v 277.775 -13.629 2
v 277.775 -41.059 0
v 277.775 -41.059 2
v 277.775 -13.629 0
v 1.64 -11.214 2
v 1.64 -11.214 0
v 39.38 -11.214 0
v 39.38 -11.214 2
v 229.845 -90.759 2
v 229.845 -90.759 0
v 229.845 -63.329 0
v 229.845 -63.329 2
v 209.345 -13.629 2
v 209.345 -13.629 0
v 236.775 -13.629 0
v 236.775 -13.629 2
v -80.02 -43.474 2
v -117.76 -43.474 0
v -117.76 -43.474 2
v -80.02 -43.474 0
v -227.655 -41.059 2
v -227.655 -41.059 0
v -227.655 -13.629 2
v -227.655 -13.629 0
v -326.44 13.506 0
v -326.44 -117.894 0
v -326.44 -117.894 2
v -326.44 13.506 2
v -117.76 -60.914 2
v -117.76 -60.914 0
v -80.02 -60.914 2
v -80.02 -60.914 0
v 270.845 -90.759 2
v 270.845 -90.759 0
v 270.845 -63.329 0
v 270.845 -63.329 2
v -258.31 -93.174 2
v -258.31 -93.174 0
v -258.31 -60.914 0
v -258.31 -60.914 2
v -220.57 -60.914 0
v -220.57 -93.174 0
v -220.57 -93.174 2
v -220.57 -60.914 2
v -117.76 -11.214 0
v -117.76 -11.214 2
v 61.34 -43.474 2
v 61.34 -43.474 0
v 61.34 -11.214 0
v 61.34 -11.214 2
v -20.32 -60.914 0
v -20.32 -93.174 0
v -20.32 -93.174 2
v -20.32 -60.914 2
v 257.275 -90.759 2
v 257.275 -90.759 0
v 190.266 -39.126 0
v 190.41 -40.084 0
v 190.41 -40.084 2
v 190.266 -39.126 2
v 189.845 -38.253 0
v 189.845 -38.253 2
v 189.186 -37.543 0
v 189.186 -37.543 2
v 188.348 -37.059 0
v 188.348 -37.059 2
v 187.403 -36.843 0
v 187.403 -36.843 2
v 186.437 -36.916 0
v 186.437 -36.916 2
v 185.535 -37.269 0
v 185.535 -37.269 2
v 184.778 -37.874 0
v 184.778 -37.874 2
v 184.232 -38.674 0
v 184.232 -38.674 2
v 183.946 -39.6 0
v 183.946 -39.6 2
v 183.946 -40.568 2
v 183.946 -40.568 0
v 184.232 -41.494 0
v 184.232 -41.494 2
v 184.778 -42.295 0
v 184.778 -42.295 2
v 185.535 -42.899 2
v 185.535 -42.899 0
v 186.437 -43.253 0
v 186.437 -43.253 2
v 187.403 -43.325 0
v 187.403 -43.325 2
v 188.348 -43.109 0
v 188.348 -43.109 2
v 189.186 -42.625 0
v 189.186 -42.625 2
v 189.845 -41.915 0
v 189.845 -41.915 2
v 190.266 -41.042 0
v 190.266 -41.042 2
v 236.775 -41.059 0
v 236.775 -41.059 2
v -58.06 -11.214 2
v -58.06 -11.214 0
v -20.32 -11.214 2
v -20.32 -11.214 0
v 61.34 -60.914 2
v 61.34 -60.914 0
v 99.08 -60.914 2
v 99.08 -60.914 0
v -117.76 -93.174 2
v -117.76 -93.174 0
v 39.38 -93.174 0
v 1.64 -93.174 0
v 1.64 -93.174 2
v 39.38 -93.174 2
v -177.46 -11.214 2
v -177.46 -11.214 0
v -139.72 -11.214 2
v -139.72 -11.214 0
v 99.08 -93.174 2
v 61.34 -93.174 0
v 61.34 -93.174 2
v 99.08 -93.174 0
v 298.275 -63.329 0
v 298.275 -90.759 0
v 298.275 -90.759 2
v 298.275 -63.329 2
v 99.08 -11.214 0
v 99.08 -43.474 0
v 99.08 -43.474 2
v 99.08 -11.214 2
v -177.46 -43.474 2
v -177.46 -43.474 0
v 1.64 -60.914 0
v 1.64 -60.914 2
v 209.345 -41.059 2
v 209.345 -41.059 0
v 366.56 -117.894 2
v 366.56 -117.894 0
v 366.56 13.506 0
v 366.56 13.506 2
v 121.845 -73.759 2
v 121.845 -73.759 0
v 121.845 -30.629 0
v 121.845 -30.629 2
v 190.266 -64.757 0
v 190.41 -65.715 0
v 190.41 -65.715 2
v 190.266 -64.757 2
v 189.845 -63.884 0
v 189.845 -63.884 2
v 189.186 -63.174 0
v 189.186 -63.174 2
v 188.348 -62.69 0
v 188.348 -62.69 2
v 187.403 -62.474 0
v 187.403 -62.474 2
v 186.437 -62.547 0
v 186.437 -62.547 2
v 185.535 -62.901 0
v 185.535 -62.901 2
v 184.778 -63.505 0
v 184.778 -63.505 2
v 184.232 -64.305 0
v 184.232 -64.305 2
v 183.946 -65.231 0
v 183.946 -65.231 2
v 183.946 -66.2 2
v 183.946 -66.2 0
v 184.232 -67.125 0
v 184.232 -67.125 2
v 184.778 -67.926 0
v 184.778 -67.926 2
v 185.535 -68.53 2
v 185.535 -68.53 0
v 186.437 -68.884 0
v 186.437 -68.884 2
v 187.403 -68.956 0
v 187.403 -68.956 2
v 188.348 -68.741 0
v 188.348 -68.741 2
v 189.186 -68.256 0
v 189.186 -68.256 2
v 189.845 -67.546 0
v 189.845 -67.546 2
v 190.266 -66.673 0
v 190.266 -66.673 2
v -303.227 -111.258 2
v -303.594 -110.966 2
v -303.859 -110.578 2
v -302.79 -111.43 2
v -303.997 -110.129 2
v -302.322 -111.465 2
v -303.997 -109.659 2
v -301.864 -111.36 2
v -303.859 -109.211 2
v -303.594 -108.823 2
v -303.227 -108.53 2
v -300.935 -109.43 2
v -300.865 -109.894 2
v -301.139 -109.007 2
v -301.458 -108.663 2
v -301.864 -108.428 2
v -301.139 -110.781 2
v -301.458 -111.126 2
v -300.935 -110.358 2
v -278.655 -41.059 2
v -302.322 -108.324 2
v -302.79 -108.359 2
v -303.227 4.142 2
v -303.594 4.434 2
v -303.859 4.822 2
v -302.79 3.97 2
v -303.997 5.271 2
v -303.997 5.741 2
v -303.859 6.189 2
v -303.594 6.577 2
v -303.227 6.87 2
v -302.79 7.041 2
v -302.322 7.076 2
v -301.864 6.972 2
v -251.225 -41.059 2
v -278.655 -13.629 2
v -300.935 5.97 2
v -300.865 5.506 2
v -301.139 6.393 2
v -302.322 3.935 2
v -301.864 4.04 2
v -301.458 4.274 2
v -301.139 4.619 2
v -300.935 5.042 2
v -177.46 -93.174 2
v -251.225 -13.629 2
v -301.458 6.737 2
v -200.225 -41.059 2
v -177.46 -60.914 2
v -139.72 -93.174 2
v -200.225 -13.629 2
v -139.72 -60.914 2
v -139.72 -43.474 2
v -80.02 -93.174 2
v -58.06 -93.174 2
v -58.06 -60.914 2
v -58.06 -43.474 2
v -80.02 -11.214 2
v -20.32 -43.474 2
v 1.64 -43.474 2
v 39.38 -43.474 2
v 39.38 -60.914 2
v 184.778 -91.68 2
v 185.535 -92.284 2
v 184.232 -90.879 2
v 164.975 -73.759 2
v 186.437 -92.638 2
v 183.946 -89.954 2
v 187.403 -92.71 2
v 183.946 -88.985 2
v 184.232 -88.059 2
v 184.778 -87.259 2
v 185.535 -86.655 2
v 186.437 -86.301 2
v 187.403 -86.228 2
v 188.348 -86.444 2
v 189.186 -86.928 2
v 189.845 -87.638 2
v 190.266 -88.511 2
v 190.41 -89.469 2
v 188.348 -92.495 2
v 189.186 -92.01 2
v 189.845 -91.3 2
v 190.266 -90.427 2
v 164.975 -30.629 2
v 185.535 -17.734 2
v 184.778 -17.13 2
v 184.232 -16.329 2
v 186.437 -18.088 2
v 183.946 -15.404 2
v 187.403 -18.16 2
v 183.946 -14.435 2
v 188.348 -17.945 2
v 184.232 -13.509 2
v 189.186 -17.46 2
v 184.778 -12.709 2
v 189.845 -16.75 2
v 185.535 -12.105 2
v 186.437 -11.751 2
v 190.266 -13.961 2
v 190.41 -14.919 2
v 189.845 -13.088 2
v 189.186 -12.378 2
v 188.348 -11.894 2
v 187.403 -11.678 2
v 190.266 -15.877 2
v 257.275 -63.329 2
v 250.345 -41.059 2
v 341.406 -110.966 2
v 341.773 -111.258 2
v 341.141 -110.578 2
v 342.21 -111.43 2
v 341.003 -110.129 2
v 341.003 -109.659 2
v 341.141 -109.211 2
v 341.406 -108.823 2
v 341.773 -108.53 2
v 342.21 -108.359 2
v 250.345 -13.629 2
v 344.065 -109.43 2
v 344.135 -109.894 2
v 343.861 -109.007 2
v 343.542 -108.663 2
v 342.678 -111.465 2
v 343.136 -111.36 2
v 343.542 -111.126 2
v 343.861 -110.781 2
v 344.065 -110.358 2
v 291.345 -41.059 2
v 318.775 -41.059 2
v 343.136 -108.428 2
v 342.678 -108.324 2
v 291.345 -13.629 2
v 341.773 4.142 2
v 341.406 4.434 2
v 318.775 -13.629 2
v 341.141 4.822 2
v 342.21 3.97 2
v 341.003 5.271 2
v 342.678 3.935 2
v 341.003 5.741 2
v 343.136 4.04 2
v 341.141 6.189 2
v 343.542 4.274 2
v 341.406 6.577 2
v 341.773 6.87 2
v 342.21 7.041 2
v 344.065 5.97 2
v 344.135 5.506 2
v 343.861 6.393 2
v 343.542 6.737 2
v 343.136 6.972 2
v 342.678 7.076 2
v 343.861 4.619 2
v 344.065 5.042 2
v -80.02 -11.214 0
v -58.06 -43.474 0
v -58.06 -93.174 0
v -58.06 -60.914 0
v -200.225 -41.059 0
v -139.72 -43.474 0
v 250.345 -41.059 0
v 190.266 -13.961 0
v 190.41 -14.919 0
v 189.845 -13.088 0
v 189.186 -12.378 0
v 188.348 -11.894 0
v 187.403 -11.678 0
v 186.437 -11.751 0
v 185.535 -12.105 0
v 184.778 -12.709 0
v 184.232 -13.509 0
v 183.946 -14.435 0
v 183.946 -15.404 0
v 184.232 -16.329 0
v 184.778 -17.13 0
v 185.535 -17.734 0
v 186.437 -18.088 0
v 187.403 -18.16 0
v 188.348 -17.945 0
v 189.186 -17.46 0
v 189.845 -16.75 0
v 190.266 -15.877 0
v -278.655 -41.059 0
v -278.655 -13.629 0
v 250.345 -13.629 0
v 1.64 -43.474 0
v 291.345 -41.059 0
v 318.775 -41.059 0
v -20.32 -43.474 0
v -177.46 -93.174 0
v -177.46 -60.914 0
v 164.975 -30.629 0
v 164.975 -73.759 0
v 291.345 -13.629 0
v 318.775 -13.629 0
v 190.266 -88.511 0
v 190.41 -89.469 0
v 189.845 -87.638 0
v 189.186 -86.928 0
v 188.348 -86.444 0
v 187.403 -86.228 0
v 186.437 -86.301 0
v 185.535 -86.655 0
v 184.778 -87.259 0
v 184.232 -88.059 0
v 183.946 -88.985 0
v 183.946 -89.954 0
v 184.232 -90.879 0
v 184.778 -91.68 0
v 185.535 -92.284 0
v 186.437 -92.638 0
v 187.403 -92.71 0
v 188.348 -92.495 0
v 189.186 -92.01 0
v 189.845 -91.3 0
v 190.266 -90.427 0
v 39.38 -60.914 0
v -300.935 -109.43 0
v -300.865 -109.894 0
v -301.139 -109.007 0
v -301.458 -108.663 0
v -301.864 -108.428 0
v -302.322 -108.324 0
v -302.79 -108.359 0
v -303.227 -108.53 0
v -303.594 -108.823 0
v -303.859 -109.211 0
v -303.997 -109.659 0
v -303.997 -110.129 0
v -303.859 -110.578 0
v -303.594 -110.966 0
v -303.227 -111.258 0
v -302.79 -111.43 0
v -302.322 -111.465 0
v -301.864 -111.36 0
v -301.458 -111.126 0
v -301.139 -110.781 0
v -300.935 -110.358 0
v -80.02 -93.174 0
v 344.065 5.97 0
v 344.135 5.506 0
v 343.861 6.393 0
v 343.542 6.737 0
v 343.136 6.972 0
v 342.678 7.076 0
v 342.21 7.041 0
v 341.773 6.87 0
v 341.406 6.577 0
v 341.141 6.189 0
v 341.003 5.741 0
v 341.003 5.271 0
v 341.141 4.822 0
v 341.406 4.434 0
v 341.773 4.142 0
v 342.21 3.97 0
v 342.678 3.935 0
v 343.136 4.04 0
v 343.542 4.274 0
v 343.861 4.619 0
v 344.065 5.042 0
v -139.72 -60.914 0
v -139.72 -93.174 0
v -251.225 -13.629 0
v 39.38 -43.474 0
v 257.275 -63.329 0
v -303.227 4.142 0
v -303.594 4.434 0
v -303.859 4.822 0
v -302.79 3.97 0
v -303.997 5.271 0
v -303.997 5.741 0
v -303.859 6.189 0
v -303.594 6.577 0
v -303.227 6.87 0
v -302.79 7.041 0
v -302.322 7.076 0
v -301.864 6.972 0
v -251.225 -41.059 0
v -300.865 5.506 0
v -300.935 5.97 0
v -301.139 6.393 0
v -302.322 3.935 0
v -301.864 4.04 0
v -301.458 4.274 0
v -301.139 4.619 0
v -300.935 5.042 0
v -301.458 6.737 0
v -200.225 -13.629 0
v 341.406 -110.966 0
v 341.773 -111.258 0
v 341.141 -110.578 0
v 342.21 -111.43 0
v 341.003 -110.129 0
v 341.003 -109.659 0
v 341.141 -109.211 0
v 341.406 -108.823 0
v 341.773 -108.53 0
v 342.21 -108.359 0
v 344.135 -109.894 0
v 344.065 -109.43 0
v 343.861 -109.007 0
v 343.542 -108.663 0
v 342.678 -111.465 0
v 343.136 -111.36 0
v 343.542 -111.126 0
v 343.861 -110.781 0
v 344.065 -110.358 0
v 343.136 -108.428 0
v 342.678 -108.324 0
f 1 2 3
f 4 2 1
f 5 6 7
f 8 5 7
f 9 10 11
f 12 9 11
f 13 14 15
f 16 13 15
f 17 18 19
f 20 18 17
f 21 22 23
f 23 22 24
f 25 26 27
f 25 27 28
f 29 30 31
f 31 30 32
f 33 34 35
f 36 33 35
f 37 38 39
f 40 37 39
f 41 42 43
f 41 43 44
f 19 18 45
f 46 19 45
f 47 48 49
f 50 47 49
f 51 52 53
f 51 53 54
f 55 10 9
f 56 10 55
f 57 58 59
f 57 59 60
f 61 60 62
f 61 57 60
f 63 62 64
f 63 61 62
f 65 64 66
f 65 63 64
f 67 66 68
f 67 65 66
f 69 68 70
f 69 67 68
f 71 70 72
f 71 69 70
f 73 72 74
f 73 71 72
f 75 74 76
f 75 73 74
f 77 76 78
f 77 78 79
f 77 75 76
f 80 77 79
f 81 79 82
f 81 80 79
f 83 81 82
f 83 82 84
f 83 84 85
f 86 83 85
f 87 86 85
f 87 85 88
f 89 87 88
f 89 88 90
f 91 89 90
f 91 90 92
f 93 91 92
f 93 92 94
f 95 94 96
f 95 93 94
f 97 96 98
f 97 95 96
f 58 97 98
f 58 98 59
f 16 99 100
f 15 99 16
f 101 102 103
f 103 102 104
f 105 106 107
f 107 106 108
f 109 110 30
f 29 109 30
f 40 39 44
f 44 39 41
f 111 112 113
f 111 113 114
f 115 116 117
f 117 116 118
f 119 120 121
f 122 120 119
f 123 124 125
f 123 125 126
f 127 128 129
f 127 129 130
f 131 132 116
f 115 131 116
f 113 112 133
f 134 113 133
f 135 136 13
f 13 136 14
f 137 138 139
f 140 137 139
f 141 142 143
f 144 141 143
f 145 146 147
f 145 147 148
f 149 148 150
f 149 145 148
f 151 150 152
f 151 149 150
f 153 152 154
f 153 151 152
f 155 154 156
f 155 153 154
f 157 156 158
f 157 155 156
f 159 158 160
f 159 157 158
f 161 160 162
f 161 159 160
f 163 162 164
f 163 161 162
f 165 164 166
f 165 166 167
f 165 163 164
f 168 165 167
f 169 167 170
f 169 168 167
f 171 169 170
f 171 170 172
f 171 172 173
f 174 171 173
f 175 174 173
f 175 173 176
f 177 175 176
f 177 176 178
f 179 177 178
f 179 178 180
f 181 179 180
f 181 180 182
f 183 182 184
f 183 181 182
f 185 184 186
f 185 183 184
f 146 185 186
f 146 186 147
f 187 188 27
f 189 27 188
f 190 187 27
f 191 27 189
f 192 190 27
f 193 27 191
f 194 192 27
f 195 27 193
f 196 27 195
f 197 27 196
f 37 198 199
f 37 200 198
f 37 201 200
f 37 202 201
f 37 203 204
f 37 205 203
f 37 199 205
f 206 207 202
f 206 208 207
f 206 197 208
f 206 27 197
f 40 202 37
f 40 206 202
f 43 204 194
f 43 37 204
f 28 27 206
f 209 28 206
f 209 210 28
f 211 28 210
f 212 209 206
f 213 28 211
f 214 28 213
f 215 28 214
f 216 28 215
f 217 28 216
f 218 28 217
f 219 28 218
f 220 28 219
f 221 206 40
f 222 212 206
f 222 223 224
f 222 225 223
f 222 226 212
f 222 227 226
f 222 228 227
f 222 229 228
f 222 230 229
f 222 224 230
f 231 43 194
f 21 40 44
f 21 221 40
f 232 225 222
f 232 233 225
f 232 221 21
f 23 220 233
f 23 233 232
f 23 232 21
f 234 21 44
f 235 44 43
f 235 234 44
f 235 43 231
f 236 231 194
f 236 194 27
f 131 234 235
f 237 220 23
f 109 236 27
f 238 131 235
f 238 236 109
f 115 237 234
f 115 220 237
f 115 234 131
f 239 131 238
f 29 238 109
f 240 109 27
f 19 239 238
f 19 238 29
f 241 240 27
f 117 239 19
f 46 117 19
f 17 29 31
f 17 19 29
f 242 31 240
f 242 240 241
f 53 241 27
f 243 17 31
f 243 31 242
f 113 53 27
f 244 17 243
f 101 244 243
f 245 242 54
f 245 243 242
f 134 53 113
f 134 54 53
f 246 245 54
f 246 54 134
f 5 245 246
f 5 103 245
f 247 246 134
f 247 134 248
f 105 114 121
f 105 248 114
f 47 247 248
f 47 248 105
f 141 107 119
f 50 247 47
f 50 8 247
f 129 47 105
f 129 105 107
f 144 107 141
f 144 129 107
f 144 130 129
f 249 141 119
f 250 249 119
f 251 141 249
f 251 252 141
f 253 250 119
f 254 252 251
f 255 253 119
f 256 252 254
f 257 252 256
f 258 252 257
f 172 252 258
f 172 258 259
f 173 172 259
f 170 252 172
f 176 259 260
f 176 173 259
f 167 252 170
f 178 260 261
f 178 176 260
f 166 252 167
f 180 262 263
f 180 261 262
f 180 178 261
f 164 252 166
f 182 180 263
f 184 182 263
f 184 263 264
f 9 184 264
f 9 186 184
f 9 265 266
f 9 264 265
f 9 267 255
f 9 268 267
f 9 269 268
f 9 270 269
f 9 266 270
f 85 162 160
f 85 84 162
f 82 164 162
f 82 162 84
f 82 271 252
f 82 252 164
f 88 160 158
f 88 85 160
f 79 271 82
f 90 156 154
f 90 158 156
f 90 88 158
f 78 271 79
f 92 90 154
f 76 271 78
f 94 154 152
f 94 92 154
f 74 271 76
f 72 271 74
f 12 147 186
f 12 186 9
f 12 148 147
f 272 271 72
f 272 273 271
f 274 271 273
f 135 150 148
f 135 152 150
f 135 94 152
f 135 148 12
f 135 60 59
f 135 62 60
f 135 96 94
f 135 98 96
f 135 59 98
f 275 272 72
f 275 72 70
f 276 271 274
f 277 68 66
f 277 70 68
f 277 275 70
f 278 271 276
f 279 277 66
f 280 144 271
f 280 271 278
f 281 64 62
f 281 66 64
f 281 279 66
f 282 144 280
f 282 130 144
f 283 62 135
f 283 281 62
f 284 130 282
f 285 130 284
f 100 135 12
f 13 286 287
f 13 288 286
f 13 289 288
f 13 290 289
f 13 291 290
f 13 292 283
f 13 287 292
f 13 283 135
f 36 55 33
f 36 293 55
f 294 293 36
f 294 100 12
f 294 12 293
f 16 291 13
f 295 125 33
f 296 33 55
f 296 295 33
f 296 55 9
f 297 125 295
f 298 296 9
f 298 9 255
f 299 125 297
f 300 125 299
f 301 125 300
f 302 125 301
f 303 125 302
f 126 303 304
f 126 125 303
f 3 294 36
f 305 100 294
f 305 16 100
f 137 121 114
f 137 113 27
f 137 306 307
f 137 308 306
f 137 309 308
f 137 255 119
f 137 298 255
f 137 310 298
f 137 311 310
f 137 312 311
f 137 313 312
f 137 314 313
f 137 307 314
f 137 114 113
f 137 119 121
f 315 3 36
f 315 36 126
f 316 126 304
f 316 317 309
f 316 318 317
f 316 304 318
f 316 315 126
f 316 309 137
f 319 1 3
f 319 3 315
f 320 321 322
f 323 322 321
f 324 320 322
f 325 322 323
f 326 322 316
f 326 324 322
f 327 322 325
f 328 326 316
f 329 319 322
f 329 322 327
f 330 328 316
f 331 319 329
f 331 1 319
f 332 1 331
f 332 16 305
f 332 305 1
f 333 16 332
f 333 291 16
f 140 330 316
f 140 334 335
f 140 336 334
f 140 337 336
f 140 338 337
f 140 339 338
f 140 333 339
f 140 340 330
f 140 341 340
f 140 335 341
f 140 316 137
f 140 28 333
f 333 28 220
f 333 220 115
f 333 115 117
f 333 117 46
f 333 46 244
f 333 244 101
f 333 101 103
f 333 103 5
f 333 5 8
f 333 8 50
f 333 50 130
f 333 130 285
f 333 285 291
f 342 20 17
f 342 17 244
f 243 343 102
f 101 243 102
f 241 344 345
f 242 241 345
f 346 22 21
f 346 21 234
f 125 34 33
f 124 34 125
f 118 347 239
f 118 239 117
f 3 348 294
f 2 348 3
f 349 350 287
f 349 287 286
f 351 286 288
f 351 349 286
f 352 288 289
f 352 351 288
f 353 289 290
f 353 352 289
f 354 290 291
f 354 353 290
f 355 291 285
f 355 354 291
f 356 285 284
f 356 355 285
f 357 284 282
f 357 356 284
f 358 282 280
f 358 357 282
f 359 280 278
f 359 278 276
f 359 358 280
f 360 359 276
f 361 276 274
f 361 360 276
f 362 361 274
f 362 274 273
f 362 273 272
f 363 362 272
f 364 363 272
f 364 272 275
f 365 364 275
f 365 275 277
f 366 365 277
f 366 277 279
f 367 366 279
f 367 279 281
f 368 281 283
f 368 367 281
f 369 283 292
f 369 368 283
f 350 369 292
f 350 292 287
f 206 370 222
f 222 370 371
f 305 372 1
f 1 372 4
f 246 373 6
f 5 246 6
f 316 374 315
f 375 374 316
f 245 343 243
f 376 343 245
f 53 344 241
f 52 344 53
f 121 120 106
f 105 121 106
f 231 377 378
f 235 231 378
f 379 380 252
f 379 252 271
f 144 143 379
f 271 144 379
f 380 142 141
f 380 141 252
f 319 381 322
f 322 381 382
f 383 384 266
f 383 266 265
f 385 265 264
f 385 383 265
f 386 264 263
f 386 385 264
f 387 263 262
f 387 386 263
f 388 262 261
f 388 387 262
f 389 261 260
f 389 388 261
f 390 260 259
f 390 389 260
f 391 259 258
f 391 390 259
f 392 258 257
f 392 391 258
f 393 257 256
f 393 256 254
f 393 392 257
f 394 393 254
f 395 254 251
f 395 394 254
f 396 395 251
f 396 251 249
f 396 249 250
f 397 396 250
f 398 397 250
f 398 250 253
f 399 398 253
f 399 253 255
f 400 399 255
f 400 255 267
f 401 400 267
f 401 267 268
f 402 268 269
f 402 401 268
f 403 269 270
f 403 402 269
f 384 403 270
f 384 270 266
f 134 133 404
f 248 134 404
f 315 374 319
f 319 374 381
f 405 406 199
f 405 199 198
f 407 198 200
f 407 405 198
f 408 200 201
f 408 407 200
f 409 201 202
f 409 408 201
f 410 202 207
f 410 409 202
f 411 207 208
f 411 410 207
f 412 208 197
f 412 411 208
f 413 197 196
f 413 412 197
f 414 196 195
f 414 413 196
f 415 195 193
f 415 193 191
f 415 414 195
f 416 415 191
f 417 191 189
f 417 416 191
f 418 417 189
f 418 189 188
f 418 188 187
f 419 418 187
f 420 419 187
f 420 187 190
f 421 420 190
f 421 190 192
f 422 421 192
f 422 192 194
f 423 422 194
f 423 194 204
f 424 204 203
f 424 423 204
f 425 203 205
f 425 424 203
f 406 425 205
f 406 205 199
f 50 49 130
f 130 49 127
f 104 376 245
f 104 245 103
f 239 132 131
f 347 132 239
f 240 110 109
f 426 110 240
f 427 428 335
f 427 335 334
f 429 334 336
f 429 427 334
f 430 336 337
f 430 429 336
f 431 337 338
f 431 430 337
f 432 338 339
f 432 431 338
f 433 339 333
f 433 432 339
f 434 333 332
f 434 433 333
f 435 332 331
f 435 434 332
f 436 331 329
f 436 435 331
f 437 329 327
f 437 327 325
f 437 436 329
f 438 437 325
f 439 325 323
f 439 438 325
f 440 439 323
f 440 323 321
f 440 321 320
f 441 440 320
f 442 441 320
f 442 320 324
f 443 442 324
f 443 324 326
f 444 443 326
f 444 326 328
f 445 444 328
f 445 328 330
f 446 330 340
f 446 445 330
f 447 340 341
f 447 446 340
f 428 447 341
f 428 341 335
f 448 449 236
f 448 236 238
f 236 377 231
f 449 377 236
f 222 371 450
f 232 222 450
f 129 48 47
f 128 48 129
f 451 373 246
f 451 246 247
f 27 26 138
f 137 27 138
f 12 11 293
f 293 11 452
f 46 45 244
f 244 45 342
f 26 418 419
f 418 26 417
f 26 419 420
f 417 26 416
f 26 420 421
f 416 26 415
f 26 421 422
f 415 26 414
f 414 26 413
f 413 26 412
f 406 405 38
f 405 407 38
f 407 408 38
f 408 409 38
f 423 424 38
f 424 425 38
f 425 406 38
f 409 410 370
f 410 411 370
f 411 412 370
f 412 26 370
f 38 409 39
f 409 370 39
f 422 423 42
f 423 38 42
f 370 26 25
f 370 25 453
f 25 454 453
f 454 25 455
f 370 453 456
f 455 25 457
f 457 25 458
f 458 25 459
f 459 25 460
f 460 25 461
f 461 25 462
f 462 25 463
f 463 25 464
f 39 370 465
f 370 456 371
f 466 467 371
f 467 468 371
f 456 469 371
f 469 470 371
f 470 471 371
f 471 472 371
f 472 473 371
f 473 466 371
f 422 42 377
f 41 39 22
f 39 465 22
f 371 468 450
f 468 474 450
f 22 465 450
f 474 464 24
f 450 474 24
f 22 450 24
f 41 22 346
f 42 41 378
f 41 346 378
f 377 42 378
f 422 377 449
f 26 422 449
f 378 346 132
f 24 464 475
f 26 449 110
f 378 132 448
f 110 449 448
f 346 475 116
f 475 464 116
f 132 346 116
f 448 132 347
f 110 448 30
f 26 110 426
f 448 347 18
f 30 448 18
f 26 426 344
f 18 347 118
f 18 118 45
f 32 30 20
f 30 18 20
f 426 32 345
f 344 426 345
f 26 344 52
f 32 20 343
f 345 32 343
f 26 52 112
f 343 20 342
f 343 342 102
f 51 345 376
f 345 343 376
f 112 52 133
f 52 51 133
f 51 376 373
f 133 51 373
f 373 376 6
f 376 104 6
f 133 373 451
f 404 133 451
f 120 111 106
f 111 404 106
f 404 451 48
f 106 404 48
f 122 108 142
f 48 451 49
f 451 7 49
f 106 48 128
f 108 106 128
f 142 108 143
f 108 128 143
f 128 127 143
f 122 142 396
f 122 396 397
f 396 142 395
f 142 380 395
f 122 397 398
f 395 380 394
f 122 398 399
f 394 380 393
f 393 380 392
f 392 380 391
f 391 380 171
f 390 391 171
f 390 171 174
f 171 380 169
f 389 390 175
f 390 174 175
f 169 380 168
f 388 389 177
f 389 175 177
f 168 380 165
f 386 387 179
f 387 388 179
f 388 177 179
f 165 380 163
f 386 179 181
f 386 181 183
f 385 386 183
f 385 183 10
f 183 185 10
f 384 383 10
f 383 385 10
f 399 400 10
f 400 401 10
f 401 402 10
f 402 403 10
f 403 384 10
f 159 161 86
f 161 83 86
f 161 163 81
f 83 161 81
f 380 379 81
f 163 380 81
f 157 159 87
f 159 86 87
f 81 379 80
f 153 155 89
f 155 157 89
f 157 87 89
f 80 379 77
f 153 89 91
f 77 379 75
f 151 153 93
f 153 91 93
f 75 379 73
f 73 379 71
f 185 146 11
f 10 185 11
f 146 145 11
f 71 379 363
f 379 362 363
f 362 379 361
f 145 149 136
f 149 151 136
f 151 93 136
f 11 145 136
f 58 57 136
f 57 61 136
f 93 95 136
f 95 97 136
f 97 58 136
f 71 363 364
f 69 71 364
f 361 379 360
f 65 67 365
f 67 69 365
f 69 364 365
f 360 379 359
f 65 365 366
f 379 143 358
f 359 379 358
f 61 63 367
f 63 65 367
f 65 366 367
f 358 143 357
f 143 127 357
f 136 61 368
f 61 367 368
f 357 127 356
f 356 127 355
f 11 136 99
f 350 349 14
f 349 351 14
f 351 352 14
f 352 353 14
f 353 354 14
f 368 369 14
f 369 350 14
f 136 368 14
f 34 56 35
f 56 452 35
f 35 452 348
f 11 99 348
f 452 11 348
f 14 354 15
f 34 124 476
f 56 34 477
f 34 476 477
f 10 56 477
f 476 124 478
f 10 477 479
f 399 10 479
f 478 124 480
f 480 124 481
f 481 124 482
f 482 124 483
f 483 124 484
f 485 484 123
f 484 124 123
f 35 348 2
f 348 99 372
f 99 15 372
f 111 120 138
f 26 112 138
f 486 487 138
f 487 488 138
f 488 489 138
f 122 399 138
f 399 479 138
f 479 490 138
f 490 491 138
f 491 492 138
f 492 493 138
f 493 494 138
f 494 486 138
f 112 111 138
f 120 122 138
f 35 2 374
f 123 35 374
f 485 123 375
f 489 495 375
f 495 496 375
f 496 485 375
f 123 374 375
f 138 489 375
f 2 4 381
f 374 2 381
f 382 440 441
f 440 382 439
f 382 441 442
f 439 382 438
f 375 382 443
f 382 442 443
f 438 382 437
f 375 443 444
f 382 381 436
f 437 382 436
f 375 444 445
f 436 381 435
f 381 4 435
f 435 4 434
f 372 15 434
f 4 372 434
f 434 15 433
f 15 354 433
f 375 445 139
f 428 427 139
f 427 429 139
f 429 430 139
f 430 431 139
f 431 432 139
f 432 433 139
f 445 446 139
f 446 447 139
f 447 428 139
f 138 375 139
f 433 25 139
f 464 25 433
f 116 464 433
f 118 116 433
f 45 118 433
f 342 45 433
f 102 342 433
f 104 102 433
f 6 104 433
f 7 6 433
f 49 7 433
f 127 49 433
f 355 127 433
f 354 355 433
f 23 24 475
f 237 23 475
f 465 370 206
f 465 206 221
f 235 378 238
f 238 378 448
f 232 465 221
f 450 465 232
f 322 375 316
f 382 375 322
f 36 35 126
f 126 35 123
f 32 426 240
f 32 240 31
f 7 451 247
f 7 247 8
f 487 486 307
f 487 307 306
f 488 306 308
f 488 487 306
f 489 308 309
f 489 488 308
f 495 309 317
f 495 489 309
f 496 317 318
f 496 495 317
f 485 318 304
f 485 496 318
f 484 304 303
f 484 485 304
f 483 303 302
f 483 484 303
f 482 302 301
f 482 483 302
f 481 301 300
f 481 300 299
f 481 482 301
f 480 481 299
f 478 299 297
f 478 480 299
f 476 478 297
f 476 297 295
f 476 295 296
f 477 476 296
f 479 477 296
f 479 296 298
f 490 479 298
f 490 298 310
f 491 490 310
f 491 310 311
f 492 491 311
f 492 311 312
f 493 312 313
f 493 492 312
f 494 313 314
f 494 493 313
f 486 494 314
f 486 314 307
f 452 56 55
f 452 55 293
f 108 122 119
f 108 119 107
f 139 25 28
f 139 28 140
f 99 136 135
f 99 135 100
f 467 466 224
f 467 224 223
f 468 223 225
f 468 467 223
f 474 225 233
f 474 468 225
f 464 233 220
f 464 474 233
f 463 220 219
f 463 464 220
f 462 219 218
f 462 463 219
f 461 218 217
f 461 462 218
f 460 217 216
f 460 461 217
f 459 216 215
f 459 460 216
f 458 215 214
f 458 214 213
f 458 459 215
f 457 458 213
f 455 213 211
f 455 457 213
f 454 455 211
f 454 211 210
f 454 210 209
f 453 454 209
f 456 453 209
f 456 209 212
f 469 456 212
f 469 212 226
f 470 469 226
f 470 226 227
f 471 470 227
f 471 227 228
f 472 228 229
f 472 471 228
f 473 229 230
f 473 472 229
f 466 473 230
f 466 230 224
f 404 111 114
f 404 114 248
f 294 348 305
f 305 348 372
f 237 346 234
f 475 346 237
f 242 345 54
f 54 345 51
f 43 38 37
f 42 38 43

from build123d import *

# Parameters (mm, degrees)
F0_W     = 693
F0_H     = 131.4
F0_R     = 1.575
F0_W_2   = 37.74
F0_H_2   = 32.26
F0_R_2   = 3.25
F0_W_3   = 27.43
F0_H_3   = 27.43
F0_W_4   = 43.13
F0_H_4   = 43.13
F1_DEPTH = 2


with BuildPart() as f1:
    # F0 (on Top) → F1 (new body)
    with BuildSketch(Plane.XY):
        with Locations((20.0601496525, -52.194238013)):
            Rectangle(F0_W, F0_H)
        with Locations((-302.4398503475, -109.894238013)):
            Circle(F0_R, mode=Mode.SUBTRACT)
        with Locations((-239.4398503475, -77.044238013)):
            Rectangle(F0_W_2, F0_H_2, mode=Mode.SUBTRACT)
        with Locations((-158.5898503475, -77.044238013)):
            Rectangle(F0_W_2, F0_H_2, mode=Mode.SUBTRACT)
        with Locations((-98.8898503475, -77.044238013)):
            Rectangle(F0_W_2, F0_H_2, mode=Mode.SUBTRACT)
        with Locations((-39.1898503475, -77.044238013)):
            Rectangle(F0_W_2, F0_H_2, mode=Mode.SUBTRACT)
        with Locations((187.1601496525, -89.469238013)):
            Circle(F0_R_2, mode=Mode.SUBTRACT)
        with Locations((342.5601496525, -109.894238013)):
            Circle(F0_R, mode=Mode.SUBTRACT)
        with Locations((20.5101496525, -77.044238013)):
            Rectangle(F0_W_2, F0_H_2, mode=Mode.SUBTRACT)
        with Locations((80.2101496525, -77.044238013)):
            Rectangle(F0_W_2, F0_H_2, mode=Mode.SUBTRACT)
        with Locations((187.1601496525, -65.7151937485)):
            Circle(F0_R_2, mode=Mode.SUBTRACT)
        with Locations((243.5601496525, -77.044238013)):
            Rectangle(F0_W_3, F0_H_3, mode=Mode.SUBTRACT)
        with Locations((284.5601496525, -77.044238013)):
            Rectangle(F0_W_3, F0_H_3, mode=Mode.SUBTRACT)
        with Locations((-264.9398503475, -27.344238013)):
            Rectangle(F0_W_3, F0_H_3, mode=Mode.SUBTRACT)
        with Locations((-213.9398503475, -27.344238013)):
            Rectangle(F0_W_3, F0_H_3, mode=Mode.SUBTRACT)
        with Locations((-158.5898503475, -27.344238013)):
            Rectangle(F0_W_2, F0_H_2, mode=Mode.SUBTRACT)
        with Locations((-98.8898503475, -27.344238013)):
            Rectangle(F0_W_2, F0_H_2, mode=Mode.SUBTRACT)
        with Locations((-39.1898503475, -27.344238013)):
            Rectangle(F0_W_2, F0_H_2, mode=Mode.SUBTRACT)
        with Locations((-302.4398503475, 5.505761987)):
            Circle(F0_R, mode=Mode.SUBTRACT)
        with Locations((143.4101496525, -52.194238013)):
            Rectangle(F0_W_4, F0_H_4, mode=Mode.SUBTRACT)
        with Locations((187.1601496525, -40.0840714574)):
            Circle(F0_R_2, mode=Mode.SUBTRACT)
        with Locations((20.5101496525, -27.344238013)):
            Rectangle(F0_W_2, F0_H_2, mode=Mode.SUBTRACT)
        with Locations((80.2101496525, -27.344238013)):
            Rectangle(F0_W_2, F0_H_2, mode=Mode.SUBTRACT)
        with Locations((223.0601496525, -27.344238013)):
            Rectangle(F0_W_3, F0_H_3, mode=Mode.SUBTRACT)
        with Locations((264.0601496525, -27.344238013)):
            Rectangle(F0_W_3, F0_H_3, mode=Mode.SUBTRACT)
        with Locations((305.0601496525, -27.344238013)):
            Rectangle(F0_W_3, F0_H_3, mode=Mode.SUBTRACT)
        with Locations((187.1601496525, -14.919238013)):
            Circle(F0_R_2, mode=Mode.SUBTRACT)
        with Locations((342.5601496525, 5.505761987)):
            Circle(F0_R, mode=Mode.SUBTRACT)
    extrude(amount=F1_DEPTH)


solid = f1.part
